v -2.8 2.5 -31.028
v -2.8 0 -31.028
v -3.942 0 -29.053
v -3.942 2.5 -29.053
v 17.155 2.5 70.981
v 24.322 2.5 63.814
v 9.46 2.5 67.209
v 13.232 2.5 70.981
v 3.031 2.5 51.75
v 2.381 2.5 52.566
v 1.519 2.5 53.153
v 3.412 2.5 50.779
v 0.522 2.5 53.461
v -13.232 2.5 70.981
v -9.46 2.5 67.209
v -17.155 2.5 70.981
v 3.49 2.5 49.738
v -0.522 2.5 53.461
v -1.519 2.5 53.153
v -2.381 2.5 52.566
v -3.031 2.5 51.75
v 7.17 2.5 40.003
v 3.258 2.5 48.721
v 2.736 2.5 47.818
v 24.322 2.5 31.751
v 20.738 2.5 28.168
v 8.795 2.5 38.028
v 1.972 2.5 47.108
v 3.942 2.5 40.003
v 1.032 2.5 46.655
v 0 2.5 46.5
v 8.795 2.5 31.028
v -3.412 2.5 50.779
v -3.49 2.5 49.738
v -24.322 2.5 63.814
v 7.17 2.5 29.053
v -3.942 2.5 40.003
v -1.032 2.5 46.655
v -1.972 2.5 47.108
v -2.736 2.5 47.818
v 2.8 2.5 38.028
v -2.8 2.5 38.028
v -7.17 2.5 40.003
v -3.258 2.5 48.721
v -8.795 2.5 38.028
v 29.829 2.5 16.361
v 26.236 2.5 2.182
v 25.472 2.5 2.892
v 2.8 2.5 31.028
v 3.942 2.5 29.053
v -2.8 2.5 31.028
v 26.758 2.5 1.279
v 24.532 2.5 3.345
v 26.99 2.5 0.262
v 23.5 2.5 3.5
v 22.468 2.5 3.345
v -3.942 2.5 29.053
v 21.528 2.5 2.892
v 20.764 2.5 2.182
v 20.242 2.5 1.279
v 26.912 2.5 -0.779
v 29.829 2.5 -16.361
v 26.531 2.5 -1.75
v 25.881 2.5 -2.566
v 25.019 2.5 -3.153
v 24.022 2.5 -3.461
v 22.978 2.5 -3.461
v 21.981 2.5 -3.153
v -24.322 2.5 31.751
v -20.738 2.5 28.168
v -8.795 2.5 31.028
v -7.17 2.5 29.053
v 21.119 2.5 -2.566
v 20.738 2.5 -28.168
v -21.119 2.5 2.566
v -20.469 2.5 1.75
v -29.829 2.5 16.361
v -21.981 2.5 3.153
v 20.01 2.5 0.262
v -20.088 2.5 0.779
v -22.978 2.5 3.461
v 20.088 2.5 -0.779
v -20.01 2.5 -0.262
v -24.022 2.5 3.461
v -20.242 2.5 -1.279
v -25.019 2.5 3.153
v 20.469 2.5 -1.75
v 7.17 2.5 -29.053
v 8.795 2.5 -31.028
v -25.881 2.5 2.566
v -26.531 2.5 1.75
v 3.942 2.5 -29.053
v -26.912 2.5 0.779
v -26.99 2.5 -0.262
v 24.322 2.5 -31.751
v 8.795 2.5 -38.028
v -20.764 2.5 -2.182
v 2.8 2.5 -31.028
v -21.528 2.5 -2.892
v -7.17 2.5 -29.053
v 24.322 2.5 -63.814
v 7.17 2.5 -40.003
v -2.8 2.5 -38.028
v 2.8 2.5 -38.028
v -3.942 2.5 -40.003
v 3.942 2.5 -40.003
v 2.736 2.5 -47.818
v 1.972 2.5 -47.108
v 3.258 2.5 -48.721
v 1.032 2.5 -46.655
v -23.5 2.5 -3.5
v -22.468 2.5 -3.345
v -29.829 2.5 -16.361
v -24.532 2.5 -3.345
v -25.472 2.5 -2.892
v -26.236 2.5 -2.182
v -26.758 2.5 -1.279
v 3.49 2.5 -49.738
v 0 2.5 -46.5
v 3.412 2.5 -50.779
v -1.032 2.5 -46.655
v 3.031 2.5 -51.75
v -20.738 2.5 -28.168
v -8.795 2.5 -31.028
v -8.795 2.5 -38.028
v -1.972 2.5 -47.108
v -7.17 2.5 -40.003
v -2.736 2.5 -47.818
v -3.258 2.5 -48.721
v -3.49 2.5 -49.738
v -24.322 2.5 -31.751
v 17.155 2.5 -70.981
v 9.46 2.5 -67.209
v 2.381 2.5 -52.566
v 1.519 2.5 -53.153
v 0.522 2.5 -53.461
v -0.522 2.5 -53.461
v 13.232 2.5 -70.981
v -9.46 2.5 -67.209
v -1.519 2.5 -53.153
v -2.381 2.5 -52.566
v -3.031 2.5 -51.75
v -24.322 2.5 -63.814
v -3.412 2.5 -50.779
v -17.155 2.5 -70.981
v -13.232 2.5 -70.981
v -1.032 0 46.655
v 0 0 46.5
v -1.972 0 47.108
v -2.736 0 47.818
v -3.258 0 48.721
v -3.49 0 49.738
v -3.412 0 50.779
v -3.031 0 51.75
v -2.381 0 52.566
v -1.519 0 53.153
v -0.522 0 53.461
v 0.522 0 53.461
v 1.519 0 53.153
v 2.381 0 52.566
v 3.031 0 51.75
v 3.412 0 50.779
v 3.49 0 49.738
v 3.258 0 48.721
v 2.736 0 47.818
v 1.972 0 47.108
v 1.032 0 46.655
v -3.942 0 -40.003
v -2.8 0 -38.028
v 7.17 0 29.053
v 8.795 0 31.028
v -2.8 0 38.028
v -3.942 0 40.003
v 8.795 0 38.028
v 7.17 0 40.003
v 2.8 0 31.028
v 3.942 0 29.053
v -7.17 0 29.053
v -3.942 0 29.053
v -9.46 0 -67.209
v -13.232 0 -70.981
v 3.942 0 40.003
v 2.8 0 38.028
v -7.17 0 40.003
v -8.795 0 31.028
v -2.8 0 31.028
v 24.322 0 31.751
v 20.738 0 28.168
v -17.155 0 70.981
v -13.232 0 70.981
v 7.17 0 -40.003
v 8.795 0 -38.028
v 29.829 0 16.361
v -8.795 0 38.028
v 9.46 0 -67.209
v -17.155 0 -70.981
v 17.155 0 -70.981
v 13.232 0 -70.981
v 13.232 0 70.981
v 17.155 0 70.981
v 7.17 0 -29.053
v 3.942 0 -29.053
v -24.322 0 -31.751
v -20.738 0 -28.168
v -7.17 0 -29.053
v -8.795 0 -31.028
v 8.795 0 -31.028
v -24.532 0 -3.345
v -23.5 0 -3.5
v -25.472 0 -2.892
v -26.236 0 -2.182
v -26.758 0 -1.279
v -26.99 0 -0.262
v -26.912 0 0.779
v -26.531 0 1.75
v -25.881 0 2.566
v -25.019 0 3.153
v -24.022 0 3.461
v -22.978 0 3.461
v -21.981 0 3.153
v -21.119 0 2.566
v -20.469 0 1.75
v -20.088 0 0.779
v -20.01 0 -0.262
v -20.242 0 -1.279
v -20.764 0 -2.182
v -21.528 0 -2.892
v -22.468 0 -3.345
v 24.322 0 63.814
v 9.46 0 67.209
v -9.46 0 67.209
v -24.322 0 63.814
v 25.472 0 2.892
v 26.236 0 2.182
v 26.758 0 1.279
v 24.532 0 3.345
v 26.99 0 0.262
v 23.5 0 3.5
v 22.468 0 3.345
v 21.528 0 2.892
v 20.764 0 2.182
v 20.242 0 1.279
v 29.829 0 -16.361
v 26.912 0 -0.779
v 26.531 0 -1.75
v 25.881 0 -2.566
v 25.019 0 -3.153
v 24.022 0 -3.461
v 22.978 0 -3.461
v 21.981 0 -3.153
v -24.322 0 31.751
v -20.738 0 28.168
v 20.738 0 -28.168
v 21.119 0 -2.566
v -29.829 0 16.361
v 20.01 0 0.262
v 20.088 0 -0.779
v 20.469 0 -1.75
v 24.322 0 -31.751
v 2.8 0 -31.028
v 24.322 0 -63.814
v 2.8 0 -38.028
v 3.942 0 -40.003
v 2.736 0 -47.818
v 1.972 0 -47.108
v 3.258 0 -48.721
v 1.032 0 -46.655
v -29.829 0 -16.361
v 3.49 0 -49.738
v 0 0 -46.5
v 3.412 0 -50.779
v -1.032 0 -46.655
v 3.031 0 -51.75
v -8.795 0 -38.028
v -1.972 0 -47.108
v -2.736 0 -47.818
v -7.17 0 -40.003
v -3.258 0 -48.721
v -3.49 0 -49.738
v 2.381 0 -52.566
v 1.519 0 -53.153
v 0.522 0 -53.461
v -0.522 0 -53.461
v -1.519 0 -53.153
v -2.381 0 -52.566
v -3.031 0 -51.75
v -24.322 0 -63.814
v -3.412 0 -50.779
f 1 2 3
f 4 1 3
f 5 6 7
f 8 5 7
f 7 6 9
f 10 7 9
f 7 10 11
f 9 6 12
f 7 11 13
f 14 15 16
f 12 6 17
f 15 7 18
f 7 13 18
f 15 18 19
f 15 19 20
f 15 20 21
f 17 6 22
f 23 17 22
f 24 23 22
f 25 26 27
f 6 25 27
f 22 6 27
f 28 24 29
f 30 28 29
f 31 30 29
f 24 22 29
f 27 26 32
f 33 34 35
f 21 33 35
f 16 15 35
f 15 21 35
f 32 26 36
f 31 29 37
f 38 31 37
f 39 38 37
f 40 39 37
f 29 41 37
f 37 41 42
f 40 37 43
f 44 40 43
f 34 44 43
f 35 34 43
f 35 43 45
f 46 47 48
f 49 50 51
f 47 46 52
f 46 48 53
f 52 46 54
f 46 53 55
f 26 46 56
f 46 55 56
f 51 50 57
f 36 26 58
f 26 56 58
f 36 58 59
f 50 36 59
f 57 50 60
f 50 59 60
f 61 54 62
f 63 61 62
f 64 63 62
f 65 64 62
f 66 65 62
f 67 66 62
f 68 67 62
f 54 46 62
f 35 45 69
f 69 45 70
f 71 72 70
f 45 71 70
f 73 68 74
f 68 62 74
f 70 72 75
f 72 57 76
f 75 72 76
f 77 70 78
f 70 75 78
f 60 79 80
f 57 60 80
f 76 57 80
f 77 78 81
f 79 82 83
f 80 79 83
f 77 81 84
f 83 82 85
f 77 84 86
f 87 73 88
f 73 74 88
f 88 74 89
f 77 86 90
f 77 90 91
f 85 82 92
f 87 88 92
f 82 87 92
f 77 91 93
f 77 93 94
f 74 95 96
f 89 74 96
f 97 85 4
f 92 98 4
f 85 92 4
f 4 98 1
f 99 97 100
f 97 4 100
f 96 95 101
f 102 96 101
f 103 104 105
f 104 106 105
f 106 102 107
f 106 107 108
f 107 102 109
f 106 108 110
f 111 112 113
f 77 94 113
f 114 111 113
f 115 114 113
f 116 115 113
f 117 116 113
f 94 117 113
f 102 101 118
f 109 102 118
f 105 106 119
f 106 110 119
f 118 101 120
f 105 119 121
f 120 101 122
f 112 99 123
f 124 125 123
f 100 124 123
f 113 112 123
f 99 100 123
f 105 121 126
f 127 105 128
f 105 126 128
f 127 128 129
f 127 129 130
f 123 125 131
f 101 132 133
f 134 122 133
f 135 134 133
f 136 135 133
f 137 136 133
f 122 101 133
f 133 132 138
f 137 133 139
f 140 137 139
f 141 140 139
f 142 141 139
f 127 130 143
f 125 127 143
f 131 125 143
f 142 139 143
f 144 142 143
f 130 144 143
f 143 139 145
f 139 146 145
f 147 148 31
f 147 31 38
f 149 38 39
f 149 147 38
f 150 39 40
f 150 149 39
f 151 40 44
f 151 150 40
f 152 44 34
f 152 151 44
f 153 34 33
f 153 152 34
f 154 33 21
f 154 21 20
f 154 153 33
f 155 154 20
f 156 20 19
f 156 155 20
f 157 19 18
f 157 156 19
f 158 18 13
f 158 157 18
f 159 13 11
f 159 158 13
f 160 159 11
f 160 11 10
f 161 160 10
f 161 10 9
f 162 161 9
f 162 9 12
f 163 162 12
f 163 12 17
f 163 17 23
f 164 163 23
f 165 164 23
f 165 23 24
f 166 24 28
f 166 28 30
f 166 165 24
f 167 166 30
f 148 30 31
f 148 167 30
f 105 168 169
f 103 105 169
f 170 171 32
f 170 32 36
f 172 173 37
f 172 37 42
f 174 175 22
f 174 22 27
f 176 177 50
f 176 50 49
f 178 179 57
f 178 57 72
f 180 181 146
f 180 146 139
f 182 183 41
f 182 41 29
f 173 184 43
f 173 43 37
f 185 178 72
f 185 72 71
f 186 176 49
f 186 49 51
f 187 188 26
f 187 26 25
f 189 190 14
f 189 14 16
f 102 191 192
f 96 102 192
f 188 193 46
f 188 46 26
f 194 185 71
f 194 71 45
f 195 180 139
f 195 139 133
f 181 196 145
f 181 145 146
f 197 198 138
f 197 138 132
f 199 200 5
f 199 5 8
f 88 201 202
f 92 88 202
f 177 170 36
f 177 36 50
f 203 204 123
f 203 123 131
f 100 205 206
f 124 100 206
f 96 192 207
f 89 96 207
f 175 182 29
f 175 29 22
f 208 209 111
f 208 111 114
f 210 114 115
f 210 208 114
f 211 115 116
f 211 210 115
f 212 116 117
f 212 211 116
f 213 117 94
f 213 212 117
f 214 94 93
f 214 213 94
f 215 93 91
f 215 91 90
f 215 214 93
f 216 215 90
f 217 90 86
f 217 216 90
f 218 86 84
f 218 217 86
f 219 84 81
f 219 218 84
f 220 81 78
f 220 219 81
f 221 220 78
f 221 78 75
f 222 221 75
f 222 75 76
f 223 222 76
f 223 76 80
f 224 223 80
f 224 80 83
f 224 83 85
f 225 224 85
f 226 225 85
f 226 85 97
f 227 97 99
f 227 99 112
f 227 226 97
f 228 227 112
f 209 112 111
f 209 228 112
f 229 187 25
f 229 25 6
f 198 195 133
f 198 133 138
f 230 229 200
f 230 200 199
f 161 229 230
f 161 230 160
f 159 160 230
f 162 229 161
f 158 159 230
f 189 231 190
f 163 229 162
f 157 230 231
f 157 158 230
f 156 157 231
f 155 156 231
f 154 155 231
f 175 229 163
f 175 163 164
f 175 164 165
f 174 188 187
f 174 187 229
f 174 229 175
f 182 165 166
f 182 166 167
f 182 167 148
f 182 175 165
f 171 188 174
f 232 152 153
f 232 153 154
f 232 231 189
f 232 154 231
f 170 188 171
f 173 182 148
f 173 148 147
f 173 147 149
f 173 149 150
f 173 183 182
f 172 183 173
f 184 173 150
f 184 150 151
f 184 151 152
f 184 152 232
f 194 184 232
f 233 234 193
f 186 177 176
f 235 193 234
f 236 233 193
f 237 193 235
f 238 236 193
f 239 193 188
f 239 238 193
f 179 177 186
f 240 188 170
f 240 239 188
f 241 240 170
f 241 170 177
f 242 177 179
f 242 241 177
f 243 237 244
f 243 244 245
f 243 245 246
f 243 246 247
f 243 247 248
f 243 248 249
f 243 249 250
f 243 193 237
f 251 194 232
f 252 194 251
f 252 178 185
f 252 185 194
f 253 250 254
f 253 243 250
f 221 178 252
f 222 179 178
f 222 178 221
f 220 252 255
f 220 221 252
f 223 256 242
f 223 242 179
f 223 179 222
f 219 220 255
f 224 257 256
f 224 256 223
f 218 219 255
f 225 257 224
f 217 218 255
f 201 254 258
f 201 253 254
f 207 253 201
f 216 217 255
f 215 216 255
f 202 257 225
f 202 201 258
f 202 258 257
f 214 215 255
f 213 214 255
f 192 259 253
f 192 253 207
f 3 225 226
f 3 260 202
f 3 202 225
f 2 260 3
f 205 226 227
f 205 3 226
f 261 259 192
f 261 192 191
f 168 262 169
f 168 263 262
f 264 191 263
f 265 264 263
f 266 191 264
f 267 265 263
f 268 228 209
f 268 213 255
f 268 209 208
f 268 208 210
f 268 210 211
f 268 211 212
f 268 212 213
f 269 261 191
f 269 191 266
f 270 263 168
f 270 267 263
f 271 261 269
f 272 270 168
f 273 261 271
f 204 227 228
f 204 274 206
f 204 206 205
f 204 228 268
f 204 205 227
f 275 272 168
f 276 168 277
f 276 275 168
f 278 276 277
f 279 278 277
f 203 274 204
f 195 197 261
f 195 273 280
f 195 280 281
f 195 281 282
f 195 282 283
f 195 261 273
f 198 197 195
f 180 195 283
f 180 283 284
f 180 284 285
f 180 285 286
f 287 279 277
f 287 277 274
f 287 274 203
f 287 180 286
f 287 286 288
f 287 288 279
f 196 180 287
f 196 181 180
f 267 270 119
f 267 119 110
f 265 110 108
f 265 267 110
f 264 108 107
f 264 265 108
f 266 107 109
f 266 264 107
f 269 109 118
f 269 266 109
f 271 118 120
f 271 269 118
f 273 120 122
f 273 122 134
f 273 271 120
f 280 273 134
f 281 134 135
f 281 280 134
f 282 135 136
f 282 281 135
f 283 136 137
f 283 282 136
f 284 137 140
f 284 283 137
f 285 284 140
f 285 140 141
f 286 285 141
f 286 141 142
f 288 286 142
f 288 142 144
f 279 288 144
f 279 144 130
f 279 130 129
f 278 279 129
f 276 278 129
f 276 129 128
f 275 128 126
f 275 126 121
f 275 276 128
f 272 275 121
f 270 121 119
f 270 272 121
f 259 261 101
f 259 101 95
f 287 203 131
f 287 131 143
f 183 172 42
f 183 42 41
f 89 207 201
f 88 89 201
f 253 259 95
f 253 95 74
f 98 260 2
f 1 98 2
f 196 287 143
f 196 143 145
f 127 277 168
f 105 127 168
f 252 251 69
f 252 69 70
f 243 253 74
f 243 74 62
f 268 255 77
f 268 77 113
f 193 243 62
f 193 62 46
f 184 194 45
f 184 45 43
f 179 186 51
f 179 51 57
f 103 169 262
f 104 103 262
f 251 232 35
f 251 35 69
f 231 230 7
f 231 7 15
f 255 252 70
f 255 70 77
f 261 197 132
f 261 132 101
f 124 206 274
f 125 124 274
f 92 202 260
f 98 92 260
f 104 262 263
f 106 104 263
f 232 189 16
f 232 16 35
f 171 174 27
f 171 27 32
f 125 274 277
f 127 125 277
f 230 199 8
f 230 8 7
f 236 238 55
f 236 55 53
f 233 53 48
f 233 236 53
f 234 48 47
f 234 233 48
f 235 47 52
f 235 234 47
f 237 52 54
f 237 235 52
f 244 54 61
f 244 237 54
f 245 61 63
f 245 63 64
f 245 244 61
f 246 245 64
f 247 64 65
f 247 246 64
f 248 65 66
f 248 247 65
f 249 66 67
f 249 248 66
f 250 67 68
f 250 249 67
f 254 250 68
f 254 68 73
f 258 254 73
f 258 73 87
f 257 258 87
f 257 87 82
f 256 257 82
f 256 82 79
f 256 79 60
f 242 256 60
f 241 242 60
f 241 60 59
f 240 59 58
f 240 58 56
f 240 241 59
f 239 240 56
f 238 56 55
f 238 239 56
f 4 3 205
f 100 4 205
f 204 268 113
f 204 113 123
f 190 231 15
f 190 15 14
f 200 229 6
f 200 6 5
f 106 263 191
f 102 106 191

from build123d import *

# Parameters (mm, degrees)
SKETCH3_R           = 3.5
BOSS_EXTRUDE1_DEPTH = 2.5


with BuildPart() as part:
    # Sketch3 → Boss-Extrude1 (new body)
    with BuildSketch(Plane(origin=(0, 0, 0), x_dir=(1, 0, 0), z_dir=(0, 1, 0))):
        Polygon((-9.459826986, 67.208739943), (9.459826986, 67.208739943), (13.231926916, 70.980839873), (17.154910843, 70.980839873), (24.321900711, 63.813850005), (24.321900711, 31.751000599), (20.738405777, 28.167505665), (29.829166609, 16.360832883), (29.829166609, -16.360832883), (20.738405777, -28.167505665), (24.321900711, -31.751000599), (24.321900711, -63.813850005), (17.154910843, -70.980839873), (13.231926916, -70.980839873), (9.459826986, -67.208739943), (-9.459826986, -67.208739943), (-13.231926916, -70.980839873), (-17.154910843, -70.980839873), (-24.321900711, -63.813850005), (-24.321900711, -31.751000599), (-20.738405777, -28.167505665), (-29.829166609, -16.360832883), (-29.829166609, 16.360832883), (-20.738405777, 28.167505665), (-24.321900711, 31.751000599), (-24.321900711, 63.813850005), (-17.154910843, 70.980839873), (-13.231926916, 70.980839873), align=None)
        with Locations(Location((23.5, 0, 0), (0, 0, 270))):
            Circle(SKETCH3_R, mode=Mode.SUBTRACT)
        with Locations(Location((-23.5, 0, 0), (0, 0, 90))):
            Circle(SKETCH3_R, mode=Mode.SUBTRACT)
        with Locations(Location((0, 50, 0), (0, 0, 270))):
            Circle(SKETCH3_R, mode=Mode.SUBTRACT)
        with Locations(Location((0, -50, 0), (0, 0, 90))):
            Circle(SKETCH3_R, mode=Mode.SUBTRACT)
        Polygon((-2.79989697, 38.028097822), (2.79989697, 38.028097822), (3.941780629, 40.002717551), (7.169853306, 40.002717551), (8.795336711, 38.028097822), (8.795336711, 31.028097822), (7.169853306, 29.053478092), (3.941780629, 29.053478092), (2.79989697, 31.028097822), (-2.79989697, 31.028097822), (-3.941780629, 29.053478092), (-7.169853306, 29.053478092), (-8.795336711, 31.028097822), (-8.795336711, 38.028097822), (-7.169853306, 40.002717551), (-3.941780629, 40.002717551), align=None, mode=Mode.SUBTRACT)
        Polygon((-2.79989697, -31.028097822), (-3.941780629, -29.053478092), (-7.169853306, -29.053478092), (-8.795336711, -31.028097822), (-8.795336711, -38.028097822), (-7.169853306, -40.002717551), (-3.941780629, -40.002717551), (-2.79989697, -38.028097822), (2.79989697, -38.028097822), (3.941780629, -40.002717551), (7.169853306, -40.002717551), (8.795336711, -38.028097822), (8.795336711, -31.028097822), (7.169853306, -29.053478092), (3.941780629, -29.053478092), (2.79989697, -31.028097822), align=None, mode=Mode.SUBTRACT)
    extrude(amount=BOSS_EXTRUDE1_DEPTH)


solid = part.part
